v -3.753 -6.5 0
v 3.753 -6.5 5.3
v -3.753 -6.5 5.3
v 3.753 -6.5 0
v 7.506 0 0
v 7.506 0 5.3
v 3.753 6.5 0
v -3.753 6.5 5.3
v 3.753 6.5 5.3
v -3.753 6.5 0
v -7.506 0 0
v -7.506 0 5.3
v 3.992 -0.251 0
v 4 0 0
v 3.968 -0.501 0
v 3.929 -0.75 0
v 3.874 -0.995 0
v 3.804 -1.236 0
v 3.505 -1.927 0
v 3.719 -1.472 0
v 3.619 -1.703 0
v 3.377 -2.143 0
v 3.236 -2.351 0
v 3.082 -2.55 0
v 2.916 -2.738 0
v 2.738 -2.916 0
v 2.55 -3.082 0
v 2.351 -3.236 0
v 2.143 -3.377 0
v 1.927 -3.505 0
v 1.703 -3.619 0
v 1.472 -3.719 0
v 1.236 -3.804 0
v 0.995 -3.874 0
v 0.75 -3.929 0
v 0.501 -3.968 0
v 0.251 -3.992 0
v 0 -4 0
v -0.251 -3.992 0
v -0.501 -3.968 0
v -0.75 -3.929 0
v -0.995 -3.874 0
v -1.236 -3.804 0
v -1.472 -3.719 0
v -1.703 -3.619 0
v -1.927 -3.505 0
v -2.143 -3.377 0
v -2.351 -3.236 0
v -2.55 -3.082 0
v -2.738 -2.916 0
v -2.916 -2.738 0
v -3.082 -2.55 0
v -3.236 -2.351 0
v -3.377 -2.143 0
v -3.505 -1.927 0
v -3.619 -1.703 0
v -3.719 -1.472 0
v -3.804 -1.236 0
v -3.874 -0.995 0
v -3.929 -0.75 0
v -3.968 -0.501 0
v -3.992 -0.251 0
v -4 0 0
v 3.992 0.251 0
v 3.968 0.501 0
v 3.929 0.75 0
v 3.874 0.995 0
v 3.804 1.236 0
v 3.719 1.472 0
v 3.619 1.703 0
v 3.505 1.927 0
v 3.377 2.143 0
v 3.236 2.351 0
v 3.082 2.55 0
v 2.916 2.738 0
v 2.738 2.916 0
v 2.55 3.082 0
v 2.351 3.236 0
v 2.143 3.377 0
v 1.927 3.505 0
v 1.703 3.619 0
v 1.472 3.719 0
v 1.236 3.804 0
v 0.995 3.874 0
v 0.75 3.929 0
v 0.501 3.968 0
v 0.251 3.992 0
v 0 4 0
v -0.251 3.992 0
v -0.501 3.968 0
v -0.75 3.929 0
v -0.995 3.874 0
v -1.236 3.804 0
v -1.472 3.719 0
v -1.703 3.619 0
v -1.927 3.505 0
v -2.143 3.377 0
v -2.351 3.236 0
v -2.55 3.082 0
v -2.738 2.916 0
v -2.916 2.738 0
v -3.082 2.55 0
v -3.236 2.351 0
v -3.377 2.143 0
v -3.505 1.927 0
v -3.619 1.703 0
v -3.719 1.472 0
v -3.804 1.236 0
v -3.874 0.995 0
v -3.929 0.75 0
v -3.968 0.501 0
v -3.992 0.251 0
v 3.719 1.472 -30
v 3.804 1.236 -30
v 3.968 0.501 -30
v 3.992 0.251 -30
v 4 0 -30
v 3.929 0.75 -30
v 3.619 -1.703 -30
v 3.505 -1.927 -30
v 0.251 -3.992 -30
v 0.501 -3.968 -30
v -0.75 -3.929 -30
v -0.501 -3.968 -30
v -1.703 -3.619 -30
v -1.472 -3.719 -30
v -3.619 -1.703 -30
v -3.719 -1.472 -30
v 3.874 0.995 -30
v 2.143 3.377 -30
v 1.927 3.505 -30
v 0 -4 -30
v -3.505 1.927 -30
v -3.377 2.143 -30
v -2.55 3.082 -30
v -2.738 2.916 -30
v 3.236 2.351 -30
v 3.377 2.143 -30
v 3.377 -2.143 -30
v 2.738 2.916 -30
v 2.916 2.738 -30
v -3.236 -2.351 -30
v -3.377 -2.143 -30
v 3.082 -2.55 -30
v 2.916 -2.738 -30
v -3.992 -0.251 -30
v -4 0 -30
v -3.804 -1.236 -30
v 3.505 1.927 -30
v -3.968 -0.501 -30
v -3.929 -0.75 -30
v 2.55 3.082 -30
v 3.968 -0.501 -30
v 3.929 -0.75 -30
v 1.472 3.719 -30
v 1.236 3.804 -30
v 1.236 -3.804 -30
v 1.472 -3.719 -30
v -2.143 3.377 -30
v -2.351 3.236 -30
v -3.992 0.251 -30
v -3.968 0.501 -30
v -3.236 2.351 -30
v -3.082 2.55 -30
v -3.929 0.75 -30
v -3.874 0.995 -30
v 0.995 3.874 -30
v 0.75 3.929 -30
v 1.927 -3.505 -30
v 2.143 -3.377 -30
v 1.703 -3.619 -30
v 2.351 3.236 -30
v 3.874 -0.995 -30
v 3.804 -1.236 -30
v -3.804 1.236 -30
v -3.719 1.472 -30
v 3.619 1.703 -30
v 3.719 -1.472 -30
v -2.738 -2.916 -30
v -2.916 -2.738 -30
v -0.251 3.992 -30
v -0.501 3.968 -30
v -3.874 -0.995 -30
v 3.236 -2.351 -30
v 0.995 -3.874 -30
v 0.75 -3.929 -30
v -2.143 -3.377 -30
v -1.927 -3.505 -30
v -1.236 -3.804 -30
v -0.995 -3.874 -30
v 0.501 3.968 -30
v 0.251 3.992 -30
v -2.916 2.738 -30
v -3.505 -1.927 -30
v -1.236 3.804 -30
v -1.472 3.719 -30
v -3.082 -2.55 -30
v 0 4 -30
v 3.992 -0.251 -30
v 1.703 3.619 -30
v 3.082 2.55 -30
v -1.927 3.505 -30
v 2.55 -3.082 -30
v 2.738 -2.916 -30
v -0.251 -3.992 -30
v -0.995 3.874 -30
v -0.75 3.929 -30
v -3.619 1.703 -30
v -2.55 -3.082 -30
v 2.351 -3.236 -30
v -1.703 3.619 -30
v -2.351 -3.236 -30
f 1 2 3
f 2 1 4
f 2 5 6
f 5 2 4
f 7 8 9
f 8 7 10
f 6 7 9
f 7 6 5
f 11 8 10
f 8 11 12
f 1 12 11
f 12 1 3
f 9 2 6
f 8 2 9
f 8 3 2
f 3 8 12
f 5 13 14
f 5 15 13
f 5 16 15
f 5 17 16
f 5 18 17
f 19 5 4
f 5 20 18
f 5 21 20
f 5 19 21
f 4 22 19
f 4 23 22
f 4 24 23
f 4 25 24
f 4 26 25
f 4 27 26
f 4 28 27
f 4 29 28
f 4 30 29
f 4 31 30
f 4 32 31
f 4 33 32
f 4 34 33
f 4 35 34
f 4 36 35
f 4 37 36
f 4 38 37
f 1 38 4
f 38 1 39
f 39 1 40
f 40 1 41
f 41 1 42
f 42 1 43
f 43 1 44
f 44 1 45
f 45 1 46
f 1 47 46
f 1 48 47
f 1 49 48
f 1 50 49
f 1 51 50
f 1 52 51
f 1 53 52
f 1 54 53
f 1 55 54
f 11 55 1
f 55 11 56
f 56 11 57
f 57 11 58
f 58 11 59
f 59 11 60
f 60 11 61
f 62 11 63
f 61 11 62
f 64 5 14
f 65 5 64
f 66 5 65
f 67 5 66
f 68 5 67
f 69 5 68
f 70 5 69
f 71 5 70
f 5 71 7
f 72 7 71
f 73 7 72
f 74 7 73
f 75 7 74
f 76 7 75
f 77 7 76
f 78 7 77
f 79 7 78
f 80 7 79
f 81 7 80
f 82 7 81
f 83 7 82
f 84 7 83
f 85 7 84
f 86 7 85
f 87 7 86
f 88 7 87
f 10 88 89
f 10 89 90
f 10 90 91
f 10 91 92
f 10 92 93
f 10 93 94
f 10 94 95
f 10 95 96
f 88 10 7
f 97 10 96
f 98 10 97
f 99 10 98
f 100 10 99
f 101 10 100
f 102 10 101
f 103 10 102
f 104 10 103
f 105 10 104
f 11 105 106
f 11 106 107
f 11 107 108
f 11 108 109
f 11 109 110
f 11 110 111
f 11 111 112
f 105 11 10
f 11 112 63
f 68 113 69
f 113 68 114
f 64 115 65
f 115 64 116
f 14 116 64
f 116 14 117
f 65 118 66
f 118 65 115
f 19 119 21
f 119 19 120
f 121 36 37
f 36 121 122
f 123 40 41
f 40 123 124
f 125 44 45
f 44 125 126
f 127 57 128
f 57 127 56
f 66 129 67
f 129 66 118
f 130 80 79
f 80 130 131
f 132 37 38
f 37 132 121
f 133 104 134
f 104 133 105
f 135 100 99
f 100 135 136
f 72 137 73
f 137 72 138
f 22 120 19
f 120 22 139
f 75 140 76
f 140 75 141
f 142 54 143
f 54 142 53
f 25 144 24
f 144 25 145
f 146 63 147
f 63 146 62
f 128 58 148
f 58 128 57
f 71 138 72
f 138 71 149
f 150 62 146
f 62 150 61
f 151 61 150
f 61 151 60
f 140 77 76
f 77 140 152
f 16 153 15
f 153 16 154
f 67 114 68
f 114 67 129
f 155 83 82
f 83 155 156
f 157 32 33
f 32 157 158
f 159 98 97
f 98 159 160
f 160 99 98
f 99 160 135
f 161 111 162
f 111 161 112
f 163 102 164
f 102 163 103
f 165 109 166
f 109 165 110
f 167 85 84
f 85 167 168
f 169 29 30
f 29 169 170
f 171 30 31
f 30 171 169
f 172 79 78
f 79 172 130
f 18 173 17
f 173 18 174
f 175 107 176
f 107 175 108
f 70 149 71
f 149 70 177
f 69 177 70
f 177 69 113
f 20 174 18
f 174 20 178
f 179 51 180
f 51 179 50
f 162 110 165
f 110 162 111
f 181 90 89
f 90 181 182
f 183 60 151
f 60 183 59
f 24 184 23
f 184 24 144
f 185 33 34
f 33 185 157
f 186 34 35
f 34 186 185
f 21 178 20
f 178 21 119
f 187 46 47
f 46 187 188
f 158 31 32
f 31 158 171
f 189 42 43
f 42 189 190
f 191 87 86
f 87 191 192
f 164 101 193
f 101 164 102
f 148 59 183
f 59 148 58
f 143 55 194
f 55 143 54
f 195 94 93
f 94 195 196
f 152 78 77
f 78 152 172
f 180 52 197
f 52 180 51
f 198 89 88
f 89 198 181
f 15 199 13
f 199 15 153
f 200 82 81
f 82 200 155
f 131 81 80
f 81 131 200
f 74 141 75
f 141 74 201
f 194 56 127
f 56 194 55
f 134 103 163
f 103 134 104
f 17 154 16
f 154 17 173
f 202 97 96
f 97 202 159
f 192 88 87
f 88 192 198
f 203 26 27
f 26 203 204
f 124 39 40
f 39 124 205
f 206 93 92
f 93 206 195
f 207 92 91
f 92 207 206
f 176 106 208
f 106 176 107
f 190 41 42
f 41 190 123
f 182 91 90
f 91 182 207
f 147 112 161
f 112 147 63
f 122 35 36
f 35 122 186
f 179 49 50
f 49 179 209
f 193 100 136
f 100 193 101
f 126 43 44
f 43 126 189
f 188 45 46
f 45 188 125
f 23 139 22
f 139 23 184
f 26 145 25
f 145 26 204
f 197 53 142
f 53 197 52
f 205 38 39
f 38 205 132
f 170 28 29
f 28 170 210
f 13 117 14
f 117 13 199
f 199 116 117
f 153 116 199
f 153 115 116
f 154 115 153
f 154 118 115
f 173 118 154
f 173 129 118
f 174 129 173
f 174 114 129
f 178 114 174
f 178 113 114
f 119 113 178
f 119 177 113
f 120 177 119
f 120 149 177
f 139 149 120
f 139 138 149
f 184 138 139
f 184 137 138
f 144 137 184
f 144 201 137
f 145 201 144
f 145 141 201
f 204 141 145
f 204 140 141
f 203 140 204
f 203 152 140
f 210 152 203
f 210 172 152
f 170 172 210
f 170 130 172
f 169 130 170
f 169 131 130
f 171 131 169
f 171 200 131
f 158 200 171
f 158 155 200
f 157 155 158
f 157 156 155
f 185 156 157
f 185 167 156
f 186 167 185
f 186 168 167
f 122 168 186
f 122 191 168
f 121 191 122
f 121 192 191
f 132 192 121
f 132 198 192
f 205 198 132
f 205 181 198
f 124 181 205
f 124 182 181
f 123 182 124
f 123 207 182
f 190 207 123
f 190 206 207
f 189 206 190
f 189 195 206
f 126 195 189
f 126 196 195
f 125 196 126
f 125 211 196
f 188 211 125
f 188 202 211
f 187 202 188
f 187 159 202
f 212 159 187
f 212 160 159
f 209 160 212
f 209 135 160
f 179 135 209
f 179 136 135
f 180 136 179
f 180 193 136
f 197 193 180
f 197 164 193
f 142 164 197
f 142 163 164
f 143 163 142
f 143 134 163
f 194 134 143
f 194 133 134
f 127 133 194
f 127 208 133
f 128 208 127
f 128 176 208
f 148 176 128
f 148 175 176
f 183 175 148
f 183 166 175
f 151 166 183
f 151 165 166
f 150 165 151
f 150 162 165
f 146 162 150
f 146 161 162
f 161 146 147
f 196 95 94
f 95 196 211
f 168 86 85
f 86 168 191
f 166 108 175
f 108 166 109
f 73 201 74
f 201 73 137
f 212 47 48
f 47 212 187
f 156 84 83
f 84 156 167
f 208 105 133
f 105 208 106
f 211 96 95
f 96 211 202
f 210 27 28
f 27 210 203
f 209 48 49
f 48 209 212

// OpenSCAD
$fn = 100;

module hex_bolt_m8() {
    head_afs = 13;
    head_height = 5.3;
    shank_diameter = 8;
    shank_length = 30;

    head_circumradius = head_afs / cos(30);

    // Head: hexagonal prism, bottom at z=0, extending up
    translate([0, 0, 0])
        cylinder(h = head_height, r = head_circumradius / 2, $fn = 6);

    // Shank: cylinder extending downward from z=0
    translate([0, 0, -shank_length])
        cylinder(h = shank_length, d = shank_diameter);
}

hex_bolt_m8();
